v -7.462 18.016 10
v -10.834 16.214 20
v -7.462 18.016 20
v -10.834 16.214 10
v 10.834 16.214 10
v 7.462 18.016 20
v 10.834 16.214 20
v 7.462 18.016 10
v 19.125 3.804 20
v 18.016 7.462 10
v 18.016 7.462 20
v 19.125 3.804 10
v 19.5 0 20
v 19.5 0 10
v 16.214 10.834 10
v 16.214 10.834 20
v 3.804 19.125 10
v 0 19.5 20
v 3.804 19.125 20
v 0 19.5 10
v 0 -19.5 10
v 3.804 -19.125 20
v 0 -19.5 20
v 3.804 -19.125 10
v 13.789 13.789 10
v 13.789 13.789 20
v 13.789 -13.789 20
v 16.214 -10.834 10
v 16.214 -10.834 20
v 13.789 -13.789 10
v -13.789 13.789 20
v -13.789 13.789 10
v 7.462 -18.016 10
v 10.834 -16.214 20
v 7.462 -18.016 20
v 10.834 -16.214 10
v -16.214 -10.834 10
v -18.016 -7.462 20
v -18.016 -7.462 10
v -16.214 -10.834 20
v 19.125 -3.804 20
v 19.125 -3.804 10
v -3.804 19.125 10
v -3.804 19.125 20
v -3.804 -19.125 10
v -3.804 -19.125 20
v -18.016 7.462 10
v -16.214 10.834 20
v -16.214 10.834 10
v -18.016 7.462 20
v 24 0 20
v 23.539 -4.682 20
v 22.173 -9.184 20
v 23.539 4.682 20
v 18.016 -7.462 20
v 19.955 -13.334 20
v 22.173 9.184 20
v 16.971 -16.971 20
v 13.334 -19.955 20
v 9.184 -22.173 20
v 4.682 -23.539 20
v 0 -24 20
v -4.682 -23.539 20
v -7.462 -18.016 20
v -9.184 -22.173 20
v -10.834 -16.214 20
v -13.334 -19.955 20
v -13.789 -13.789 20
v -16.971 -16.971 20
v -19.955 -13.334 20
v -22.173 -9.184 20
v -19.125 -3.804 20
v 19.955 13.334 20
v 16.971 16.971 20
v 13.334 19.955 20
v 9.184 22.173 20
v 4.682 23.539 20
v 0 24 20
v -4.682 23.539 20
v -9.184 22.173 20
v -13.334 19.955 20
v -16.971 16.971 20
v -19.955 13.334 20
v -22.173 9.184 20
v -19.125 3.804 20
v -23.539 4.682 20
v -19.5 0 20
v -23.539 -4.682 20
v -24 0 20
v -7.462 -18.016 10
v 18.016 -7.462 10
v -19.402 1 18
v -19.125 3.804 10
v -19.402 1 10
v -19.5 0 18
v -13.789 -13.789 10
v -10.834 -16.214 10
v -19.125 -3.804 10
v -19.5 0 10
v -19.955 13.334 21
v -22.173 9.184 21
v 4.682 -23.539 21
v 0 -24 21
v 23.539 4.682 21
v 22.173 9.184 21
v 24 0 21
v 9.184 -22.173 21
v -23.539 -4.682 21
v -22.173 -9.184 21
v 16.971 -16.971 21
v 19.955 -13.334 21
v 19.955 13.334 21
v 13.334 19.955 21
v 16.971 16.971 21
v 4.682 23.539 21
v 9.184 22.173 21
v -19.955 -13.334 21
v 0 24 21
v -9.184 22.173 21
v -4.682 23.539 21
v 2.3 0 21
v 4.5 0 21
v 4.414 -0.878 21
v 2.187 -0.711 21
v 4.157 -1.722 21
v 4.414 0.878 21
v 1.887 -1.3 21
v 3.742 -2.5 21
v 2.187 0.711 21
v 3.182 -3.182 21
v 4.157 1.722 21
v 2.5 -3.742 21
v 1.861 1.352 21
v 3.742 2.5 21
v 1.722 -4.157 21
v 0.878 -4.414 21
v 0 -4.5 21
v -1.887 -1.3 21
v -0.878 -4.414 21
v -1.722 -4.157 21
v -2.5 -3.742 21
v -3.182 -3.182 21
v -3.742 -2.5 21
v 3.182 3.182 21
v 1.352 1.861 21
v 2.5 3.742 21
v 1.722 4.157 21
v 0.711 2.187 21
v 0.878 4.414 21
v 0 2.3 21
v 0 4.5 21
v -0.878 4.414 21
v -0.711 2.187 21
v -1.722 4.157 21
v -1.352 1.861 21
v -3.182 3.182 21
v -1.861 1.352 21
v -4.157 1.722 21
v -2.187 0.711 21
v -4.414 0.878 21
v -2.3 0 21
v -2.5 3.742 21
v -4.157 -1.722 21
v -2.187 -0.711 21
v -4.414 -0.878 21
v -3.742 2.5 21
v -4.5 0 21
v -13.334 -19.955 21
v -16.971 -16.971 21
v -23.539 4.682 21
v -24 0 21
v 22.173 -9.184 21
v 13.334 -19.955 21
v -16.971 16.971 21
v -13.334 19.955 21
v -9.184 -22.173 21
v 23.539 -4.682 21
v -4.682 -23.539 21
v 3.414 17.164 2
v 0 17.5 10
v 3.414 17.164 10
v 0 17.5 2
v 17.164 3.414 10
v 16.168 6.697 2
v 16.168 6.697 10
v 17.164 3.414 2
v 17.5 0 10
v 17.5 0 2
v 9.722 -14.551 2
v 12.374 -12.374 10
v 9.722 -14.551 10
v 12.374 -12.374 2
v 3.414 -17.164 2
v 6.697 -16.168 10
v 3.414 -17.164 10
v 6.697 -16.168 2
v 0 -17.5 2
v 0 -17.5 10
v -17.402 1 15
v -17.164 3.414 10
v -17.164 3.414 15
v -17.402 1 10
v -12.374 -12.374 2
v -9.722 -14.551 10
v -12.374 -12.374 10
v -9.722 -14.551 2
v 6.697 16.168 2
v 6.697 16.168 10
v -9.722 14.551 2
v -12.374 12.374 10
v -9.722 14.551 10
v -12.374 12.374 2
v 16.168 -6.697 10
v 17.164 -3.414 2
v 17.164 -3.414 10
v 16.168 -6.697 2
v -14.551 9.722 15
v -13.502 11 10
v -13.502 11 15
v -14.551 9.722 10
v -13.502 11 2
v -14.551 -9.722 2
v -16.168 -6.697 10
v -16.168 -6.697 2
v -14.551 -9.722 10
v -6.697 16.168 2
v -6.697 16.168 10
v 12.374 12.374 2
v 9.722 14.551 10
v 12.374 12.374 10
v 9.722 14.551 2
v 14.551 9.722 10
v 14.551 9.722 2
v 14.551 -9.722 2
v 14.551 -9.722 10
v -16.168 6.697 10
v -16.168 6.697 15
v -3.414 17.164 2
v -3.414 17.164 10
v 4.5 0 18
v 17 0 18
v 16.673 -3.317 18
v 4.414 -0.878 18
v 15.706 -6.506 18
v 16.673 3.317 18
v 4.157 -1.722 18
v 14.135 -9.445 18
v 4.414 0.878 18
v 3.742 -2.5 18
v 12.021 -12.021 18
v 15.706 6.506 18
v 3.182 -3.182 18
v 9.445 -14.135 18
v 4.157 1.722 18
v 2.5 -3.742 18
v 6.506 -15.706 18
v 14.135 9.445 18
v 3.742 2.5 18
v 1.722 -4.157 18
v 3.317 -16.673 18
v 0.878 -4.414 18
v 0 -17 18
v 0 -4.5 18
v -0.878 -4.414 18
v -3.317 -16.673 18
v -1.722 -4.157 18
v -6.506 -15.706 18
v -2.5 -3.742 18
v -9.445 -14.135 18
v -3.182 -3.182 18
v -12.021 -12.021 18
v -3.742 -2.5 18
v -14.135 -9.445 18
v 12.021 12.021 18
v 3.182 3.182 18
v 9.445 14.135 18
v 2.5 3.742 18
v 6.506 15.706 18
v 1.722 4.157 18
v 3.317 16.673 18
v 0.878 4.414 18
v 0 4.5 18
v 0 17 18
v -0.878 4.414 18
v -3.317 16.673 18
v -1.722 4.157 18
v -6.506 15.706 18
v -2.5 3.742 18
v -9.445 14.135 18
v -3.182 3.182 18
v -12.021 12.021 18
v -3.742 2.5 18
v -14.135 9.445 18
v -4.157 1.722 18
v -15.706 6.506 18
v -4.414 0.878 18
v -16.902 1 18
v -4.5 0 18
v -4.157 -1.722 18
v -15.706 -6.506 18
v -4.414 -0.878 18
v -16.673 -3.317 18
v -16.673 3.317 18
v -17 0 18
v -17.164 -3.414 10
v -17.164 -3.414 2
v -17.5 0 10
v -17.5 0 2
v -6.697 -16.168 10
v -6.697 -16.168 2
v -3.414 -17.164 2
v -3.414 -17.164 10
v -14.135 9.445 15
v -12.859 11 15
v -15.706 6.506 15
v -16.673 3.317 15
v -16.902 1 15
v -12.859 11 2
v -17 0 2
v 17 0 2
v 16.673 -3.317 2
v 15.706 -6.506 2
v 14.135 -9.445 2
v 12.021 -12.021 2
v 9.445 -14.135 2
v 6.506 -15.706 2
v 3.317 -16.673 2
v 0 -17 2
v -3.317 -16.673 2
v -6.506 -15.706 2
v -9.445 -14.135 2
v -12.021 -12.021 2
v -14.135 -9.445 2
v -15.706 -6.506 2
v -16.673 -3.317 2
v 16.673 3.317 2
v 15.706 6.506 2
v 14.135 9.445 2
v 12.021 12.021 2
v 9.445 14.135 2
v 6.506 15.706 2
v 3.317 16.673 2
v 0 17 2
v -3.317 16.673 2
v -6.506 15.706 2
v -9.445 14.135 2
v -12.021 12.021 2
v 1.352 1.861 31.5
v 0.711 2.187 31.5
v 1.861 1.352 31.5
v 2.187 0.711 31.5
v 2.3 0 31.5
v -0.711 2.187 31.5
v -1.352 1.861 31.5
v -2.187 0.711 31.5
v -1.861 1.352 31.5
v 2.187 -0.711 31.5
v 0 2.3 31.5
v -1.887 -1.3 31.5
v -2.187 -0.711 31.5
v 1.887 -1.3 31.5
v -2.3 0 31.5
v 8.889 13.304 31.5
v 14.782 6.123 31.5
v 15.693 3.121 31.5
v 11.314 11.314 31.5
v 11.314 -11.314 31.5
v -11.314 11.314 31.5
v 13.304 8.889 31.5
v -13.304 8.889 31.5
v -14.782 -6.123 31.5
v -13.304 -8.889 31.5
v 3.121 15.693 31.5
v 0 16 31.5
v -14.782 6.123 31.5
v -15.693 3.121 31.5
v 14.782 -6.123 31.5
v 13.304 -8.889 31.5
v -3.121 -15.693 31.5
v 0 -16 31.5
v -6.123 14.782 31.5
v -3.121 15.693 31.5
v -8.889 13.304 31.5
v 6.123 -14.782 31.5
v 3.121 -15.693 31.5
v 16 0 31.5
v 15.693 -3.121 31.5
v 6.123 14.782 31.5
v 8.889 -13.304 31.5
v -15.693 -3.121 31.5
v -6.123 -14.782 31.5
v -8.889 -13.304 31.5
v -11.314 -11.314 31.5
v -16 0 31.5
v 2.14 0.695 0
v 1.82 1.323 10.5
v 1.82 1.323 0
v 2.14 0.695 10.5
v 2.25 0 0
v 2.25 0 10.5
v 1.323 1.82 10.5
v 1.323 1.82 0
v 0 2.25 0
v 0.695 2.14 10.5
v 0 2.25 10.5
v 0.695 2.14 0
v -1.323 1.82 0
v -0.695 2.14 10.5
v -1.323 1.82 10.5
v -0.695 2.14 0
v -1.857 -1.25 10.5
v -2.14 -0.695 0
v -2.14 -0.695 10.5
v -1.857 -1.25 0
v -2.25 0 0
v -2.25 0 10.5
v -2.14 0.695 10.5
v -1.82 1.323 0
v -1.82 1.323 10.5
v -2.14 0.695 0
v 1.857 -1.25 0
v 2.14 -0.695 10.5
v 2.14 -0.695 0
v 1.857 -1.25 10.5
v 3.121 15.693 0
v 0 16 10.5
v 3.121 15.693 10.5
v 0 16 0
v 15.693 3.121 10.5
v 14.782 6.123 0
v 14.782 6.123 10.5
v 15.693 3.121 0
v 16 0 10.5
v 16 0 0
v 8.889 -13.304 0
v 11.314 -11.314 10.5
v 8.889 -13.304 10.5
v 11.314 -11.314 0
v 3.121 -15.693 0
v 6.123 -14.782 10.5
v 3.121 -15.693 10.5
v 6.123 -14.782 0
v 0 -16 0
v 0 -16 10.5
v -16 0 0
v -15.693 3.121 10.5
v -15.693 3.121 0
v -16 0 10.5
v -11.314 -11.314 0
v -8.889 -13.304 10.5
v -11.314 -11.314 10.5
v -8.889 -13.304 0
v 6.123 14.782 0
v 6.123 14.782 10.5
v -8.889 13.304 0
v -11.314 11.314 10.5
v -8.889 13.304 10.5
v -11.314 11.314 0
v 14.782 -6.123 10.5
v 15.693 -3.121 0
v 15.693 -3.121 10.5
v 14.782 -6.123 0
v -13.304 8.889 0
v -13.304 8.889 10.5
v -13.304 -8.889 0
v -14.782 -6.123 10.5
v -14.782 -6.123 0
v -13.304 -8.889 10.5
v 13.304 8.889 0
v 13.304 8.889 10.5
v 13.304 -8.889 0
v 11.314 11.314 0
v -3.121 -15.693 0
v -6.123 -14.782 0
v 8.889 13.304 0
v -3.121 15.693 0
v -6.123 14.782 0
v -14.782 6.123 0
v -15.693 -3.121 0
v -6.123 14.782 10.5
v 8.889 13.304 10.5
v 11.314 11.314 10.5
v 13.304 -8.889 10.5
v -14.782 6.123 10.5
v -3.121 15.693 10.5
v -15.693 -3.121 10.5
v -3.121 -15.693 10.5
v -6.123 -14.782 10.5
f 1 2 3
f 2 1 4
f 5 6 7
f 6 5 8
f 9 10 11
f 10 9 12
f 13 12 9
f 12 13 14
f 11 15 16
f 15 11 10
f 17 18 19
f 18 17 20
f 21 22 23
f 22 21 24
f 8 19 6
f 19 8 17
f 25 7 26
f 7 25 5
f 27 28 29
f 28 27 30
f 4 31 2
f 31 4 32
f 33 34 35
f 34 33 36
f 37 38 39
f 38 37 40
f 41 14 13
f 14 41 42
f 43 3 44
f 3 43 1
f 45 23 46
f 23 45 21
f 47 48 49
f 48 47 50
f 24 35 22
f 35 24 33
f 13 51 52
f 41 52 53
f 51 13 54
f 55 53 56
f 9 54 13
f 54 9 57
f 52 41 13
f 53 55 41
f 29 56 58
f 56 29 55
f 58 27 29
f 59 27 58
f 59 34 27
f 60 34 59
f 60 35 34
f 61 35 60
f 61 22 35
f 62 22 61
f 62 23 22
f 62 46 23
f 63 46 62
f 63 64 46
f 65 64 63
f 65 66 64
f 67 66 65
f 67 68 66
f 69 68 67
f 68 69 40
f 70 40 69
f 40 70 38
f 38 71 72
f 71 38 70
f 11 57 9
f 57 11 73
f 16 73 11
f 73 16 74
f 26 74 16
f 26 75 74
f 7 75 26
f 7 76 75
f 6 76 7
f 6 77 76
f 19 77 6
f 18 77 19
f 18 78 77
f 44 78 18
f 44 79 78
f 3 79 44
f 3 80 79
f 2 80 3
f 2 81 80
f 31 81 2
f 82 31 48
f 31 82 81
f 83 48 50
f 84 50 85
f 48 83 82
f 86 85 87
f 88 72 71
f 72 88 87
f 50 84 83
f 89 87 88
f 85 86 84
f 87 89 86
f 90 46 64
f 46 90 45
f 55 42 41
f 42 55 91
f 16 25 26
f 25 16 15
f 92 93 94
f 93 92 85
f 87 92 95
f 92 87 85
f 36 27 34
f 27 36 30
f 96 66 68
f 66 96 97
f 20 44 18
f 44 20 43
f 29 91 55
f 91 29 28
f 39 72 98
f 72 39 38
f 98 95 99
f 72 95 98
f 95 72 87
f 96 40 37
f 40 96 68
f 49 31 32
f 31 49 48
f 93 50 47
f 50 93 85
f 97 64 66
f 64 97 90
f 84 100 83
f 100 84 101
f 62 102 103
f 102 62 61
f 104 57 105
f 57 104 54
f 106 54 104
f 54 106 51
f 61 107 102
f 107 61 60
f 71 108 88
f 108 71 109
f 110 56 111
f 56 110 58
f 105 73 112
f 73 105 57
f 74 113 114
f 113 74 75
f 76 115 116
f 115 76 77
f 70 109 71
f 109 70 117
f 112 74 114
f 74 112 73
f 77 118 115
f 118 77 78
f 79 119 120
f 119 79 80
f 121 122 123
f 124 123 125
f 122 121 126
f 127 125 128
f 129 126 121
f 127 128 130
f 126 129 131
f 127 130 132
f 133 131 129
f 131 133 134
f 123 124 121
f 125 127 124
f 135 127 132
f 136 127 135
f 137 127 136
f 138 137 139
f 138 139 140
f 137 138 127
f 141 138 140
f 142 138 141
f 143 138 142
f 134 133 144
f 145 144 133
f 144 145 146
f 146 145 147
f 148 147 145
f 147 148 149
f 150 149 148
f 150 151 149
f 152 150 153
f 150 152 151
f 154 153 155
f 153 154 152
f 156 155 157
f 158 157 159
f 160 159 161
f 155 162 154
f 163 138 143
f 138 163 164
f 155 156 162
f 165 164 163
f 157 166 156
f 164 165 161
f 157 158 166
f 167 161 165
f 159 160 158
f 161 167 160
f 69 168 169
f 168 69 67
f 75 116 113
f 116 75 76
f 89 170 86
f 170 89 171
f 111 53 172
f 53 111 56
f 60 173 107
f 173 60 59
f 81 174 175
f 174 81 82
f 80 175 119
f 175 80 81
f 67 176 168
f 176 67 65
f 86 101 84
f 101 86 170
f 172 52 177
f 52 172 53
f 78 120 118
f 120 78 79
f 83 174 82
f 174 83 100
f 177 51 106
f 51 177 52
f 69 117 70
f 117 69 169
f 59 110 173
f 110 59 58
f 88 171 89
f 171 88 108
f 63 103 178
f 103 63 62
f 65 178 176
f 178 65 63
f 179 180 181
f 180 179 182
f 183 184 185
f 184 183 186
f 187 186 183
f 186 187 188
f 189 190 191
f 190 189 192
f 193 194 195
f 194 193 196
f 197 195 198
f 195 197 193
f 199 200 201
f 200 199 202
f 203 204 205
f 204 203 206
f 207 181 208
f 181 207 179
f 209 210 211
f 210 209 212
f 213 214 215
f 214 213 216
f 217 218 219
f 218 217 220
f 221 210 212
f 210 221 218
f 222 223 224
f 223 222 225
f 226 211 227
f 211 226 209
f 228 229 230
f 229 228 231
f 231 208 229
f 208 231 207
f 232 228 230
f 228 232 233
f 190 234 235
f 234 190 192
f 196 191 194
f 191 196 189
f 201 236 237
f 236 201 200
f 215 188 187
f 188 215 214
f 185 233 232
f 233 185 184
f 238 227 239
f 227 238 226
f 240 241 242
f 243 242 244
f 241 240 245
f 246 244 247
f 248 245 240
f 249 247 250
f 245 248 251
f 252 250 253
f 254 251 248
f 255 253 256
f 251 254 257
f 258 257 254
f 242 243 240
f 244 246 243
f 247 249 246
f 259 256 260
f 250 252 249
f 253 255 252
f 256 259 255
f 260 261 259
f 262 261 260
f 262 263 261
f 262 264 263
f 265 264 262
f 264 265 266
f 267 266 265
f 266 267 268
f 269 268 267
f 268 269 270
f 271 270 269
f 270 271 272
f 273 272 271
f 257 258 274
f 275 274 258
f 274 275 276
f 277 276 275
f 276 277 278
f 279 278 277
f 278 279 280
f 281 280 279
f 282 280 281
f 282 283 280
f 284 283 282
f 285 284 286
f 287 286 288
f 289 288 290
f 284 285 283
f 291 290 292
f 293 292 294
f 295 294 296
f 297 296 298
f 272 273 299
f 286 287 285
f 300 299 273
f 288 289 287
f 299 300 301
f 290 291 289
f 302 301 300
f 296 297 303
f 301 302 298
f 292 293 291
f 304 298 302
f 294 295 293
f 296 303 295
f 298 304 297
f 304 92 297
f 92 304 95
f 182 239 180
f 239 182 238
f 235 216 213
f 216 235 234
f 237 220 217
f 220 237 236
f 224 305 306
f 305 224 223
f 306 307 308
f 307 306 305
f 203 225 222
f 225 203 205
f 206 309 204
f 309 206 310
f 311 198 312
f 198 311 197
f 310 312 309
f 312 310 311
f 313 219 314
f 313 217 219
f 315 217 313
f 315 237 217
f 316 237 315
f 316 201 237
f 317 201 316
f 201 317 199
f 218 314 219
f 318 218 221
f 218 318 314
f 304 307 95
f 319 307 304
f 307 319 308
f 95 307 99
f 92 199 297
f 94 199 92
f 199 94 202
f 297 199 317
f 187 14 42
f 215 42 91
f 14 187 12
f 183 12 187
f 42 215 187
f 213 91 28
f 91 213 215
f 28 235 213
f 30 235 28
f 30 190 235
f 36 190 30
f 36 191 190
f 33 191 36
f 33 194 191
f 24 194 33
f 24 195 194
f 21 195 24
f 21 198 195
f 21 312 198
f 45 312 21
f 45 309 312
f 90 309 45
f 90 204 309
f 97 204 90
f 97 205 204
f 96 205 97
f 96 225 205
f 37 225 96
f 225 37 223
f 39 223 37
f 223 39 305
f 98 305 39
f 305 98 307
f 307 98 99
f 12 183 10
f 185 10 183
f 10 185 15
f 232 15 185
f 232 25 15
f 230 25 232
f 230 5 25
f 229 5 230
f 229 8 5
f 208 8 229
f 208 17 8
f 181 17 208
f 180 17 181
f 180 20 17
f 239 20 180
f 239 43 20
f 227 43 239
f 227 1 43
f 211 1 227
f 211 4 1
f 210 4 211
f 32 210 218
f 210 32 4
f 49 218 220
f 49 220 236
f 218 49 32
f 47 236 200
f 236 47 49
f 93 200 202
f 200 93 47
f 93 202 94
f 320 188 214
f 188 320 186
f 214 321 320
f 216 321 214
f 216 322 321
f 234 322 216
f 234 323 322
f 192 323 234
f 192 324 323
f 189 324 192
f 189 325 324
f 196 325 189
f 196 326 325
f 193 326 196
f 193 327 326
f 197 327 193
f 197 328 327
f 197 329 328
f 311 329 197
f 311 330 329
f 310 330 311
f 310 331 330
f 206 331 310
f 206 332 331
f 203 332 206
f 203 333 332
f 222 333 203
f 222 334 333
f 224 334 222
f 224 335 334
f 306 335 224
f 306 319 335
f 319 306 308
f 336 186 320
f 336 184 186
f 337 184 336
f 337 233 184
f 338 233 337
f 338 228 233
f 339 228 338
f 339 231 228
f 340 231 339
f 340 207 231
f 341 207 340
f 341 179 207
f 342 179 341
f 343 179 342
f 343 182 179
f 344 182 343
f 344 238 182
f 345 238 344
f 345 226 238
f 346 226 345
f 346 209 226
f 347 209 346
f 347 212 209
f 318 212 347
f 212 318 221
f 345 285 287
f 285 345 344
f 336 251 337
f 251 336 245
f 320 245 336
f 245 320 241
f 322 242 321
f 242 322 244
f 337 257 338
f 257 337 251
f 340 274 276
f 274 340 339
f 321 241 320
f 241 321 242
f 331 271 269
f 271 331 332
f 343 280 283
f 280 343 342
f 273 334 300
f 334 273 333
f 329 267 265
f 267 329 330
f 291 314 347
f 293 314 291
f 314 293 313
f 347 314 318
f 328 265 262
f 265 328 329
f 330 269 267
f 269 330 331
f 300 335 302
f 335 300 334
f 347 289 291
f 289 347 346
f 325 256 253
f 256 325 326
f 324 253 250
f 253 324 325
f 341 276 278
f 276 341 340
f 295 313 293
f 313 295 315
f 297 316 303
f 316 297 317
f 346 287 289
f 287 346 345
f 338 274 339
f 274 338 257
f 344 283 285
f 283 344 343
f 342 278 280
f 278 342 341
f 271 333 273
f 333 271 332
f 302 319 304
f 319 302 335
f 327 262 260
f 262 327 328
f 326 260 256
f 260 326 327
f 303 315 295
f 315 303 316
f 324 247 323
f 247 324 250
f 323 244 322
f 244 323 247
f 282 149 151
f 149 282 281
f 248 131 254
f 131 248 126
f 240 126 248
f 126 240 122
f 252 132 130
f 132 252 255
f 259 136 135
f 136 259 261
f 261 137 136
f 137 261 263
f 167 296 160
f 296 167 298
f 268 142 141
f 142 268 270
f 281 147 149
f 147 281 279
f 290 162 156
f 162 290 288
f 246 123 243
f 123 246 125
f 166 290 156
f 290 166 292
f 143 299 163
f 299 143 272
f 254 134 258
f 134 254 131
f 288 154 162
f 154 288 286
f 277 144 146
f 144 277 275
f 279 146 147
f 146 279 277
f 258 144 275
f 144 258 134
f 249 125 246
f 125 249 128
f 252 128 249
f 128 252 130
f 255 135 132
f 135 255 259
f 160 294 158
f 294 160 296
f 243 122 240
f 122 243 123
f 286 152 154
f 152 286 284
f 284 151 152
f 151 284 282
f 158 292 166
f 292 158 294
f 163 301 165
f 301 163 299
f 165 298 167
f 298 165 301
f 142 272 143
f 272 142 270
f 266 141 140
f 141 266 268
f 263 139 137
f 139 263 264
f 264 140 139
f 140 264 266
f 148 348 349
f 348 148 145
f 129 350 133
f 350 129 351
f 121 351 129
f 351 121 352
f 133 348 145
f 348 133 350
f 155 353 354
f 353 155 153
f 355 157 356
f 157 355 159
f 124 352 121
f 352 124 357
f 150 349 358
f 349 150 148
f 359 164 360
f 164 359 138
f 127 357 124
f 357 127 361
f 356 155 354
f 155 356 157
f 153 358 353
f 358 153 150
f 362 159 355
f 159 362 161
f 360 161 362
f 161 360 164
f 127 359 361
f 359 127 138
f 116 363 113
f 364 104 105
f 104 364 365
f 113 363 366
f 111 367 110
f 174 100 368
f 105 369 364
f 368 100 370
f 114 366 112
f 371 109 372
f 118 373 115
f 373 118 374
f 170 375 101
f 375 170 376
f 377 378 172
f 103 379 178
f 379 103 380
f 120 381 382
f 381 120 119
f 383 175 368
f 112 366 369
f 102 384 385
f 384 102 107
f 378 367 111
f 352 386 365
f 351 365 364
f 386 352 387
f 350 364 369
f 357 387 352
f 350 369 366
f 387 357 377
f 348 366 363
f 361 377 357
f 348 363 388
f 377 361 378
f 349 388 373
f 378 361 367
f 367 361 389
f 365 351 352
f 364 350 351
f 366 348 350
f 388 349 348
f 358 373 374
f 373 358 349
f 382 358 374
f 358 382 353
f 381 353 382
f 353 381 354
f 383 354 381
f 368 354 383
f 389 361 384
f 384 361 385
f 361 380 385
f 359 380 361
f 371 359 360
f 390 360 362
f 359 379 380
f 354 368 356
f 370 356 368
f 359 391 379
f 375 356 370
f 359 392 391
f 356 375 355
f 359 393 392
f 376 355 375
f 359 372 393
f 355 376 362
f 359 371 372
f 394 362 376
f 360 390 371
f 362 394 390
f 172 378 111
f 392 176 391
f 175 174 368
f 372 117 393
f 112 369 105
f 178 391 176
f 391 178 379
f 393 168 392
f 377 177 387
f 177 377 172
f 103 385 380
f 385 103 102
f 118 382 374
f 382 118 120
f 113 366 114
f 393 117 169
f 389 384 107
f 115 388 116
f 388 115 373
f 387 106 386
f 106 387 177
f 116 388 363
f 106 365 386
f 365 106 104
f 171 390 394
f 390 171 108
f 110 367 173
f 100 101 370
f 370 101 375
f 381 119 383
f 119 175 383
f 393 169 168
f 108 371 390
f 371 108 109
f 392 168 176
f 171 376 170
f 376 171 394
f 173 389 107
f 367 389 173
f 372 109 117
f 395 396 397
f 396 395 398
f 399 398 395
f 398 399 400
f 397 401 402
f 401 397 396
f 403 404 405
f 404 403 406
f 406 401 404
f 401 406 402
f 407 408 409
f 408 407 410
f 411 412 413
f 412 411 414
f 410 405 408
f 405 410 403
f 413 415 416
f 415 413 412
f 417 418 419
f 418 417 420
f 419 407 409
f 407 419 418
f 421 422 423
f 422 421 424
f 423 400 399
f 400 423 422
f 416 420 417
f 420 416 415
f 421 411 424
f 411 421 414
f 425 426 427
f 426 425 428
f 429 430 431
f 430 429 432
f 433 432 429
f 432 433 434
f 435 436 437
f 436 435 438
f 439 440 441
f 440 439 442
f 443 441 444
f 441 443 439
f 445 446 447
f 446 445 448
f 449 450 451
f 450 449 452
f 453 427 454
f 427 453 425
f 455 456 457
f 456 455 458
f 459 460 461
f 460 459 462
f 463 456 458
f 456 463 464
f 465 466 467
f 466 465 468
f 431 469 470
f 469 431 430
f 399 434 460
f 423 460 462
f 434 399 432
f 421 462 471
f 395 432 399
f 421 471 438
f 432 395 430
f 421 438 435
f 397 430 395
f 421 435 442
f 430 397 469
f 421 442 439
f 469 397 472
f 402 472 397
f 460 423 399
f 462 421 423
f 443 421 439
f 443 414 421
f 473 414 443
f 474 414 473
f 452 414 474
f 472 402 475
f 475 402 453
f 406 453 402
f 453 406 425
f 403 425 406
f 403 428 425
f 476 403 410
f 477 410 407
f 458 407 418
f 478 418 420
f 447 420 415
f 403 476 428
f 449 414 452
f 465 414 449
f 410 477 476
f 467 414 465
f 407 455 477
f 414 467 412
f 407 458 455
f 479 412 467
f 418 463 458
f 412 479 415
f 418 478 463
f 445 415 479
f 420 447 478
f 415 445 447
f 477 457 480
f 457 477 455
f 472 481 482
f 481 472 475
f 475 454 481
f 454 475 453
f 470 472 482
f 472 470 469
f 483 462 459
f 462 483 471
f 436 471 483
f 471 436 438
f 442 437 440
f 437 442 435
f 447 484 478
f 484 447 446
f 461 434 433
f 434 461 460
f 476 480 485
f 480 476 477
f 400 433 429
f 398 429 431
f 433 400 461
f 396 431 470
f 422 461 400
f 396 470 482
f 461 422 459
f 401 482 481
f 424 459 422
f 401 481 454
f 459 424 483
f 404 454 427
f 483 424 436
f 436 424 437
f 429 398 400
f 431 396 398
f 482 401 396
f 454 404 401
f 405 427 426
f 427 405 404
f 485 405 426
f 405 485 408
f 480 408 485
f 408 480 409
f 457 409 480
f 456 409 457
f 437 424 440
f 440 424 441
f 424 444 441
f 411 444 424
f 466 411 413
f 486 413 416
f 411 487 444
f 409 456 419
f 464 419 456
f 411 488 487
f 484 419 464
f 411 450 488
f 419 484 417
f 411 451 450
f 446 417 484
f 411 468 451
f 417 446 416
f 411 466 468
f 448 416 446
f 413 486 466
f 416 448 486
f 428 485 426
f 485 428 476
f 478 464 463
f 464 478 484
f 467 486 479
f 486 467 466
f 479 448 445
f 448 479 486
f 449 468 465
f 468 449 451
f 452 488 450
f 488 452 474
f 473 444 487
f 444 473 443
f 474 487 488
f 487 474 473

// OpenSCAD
module test_rotator(w) {
    difference() {
        cylinder(10.5, d=32, $fn=32);
        translate([0, 0, -1])
        difference() {
            cylinder(21, d=w, $fn=20);
            translate([-w/2, -w/2, 0])
            translate([0, 0, -1])
            cube([w, 1, 25]);
        }
    }
}

module rotator_incline(w, dia1 = 32, dia2 = 32) {
    difference() {
        cylinder(10.5, d1=dia1, d2=dia2, $fn=32);
        translate([0, 0, -1])
        difference() {
            cylinder(21, d=w, $fn=20);
            translate([-w/2, -w/2, 0])
            translate([0, 0, -1])
            cube([w, 1, 25]);
        }
    }
}

//test_rotator(6.25);

module spool_male() {
    difference() {
    union() {
        difference () {
            difference() {
                // the center whole
                difference() {
                    // the spool
                    difference() {
                        // the edges
                        union() {
                            cylinder(1, d=48, $fn=32);
                            cylinder(20, d=39, $fn=32);
                            translate([0, 0, 20])
                            cylinder(1, d=48, $fn=32);
                        }
                        translate([0, 0, -1])
                        cylinder(19, d=35, $fn=32);
                    }
                }
                union() {
                    translate([-20, 0, 5])
                    cube([10,11,10]);
                    translate([-20, 0, 2])
                    cube([10, 1, 16]);
                }
            }
            translate([0, 0, -1])
            cylinder(11, d=48.5, $fn=31);
        }
        difference() {
            difference() {
                translate([0, 0, 2])
                cylinder(17, d=35, $fn=32);
                translate([0, 0, -1])
                cylinder(19, d=34, $fn=32);
            }
            // hack
            union() {
                translate([-20, 0, 1])
                //cube([10, 10, 14]);
                cube([10,11,14]);
                translate([-20, 0, 2])
                cube([10, 1, 16]);
            }
        }
    }
    translate([0, 0, -5])
    cylinder(40, d=9, $fn=32);
    }

}

module spool_female() {
    difference () {
        difference() {
            // the center whole
            difference() {
                // the spool
                difference() {
                    // the edges
                    union() {
                        cylinder(1, d=48, $fn=32);
                        cylinder(20, d=39, $fn=32);
                        translate([0, 0, 20])
                        cylinder(1, d=48, $fn=32);
                    }
                    translate([0, 0, -1])
                    cylinder(19, d=35, $fn=32);
                }
                //translate([0, 0, -5])
                cylinder(40, d=9, $fn=32);
            }
            union() {
                // Mirror!
                translate([-20, -10, 5])
                cube(10);
                translate([-20, 0, 2])
                cube([10, 1, 16]);
            }
        }
        translate([0, 0, -1])
        cylinder(11, d=48.5, $fn=31);
    }


    //difference() {
    //difference() {
    //    translate([0, 0, 2])
    //    cylinder(17, d=31, $fn=32);
    //    translate([0, 0, -1])
    //    cylinder(19, d=30, $fn=32);
    //}
    //// hack
    //union() {
    //    translate([-20, 0, 1])
    //    cube([10, 10, 14]);
    //    translate([-20, 0, 2])
    //    cube([10, 1, 16]);
    //}
    //}
}

module shaft() {
    difference() {
        union() {
        cube([40, 40, 2]);
        translate([20, 20, -40])
        cylinder(40, d=5, $fn=32);
        }
        translate([19.75, 15, -41])
        cube([0.5, 10, 10]);
    }
}

module spool_female_2()
{
spool_female();
translate([0,0,21])
//rotator_incline(6.25, 48);
rotator_incline(4.6, 48);
}
color([1,0,0]) spool_male();
color([0,1,0]) spool_female_2();
color([0,0,1]) test_rotator(4.5);
